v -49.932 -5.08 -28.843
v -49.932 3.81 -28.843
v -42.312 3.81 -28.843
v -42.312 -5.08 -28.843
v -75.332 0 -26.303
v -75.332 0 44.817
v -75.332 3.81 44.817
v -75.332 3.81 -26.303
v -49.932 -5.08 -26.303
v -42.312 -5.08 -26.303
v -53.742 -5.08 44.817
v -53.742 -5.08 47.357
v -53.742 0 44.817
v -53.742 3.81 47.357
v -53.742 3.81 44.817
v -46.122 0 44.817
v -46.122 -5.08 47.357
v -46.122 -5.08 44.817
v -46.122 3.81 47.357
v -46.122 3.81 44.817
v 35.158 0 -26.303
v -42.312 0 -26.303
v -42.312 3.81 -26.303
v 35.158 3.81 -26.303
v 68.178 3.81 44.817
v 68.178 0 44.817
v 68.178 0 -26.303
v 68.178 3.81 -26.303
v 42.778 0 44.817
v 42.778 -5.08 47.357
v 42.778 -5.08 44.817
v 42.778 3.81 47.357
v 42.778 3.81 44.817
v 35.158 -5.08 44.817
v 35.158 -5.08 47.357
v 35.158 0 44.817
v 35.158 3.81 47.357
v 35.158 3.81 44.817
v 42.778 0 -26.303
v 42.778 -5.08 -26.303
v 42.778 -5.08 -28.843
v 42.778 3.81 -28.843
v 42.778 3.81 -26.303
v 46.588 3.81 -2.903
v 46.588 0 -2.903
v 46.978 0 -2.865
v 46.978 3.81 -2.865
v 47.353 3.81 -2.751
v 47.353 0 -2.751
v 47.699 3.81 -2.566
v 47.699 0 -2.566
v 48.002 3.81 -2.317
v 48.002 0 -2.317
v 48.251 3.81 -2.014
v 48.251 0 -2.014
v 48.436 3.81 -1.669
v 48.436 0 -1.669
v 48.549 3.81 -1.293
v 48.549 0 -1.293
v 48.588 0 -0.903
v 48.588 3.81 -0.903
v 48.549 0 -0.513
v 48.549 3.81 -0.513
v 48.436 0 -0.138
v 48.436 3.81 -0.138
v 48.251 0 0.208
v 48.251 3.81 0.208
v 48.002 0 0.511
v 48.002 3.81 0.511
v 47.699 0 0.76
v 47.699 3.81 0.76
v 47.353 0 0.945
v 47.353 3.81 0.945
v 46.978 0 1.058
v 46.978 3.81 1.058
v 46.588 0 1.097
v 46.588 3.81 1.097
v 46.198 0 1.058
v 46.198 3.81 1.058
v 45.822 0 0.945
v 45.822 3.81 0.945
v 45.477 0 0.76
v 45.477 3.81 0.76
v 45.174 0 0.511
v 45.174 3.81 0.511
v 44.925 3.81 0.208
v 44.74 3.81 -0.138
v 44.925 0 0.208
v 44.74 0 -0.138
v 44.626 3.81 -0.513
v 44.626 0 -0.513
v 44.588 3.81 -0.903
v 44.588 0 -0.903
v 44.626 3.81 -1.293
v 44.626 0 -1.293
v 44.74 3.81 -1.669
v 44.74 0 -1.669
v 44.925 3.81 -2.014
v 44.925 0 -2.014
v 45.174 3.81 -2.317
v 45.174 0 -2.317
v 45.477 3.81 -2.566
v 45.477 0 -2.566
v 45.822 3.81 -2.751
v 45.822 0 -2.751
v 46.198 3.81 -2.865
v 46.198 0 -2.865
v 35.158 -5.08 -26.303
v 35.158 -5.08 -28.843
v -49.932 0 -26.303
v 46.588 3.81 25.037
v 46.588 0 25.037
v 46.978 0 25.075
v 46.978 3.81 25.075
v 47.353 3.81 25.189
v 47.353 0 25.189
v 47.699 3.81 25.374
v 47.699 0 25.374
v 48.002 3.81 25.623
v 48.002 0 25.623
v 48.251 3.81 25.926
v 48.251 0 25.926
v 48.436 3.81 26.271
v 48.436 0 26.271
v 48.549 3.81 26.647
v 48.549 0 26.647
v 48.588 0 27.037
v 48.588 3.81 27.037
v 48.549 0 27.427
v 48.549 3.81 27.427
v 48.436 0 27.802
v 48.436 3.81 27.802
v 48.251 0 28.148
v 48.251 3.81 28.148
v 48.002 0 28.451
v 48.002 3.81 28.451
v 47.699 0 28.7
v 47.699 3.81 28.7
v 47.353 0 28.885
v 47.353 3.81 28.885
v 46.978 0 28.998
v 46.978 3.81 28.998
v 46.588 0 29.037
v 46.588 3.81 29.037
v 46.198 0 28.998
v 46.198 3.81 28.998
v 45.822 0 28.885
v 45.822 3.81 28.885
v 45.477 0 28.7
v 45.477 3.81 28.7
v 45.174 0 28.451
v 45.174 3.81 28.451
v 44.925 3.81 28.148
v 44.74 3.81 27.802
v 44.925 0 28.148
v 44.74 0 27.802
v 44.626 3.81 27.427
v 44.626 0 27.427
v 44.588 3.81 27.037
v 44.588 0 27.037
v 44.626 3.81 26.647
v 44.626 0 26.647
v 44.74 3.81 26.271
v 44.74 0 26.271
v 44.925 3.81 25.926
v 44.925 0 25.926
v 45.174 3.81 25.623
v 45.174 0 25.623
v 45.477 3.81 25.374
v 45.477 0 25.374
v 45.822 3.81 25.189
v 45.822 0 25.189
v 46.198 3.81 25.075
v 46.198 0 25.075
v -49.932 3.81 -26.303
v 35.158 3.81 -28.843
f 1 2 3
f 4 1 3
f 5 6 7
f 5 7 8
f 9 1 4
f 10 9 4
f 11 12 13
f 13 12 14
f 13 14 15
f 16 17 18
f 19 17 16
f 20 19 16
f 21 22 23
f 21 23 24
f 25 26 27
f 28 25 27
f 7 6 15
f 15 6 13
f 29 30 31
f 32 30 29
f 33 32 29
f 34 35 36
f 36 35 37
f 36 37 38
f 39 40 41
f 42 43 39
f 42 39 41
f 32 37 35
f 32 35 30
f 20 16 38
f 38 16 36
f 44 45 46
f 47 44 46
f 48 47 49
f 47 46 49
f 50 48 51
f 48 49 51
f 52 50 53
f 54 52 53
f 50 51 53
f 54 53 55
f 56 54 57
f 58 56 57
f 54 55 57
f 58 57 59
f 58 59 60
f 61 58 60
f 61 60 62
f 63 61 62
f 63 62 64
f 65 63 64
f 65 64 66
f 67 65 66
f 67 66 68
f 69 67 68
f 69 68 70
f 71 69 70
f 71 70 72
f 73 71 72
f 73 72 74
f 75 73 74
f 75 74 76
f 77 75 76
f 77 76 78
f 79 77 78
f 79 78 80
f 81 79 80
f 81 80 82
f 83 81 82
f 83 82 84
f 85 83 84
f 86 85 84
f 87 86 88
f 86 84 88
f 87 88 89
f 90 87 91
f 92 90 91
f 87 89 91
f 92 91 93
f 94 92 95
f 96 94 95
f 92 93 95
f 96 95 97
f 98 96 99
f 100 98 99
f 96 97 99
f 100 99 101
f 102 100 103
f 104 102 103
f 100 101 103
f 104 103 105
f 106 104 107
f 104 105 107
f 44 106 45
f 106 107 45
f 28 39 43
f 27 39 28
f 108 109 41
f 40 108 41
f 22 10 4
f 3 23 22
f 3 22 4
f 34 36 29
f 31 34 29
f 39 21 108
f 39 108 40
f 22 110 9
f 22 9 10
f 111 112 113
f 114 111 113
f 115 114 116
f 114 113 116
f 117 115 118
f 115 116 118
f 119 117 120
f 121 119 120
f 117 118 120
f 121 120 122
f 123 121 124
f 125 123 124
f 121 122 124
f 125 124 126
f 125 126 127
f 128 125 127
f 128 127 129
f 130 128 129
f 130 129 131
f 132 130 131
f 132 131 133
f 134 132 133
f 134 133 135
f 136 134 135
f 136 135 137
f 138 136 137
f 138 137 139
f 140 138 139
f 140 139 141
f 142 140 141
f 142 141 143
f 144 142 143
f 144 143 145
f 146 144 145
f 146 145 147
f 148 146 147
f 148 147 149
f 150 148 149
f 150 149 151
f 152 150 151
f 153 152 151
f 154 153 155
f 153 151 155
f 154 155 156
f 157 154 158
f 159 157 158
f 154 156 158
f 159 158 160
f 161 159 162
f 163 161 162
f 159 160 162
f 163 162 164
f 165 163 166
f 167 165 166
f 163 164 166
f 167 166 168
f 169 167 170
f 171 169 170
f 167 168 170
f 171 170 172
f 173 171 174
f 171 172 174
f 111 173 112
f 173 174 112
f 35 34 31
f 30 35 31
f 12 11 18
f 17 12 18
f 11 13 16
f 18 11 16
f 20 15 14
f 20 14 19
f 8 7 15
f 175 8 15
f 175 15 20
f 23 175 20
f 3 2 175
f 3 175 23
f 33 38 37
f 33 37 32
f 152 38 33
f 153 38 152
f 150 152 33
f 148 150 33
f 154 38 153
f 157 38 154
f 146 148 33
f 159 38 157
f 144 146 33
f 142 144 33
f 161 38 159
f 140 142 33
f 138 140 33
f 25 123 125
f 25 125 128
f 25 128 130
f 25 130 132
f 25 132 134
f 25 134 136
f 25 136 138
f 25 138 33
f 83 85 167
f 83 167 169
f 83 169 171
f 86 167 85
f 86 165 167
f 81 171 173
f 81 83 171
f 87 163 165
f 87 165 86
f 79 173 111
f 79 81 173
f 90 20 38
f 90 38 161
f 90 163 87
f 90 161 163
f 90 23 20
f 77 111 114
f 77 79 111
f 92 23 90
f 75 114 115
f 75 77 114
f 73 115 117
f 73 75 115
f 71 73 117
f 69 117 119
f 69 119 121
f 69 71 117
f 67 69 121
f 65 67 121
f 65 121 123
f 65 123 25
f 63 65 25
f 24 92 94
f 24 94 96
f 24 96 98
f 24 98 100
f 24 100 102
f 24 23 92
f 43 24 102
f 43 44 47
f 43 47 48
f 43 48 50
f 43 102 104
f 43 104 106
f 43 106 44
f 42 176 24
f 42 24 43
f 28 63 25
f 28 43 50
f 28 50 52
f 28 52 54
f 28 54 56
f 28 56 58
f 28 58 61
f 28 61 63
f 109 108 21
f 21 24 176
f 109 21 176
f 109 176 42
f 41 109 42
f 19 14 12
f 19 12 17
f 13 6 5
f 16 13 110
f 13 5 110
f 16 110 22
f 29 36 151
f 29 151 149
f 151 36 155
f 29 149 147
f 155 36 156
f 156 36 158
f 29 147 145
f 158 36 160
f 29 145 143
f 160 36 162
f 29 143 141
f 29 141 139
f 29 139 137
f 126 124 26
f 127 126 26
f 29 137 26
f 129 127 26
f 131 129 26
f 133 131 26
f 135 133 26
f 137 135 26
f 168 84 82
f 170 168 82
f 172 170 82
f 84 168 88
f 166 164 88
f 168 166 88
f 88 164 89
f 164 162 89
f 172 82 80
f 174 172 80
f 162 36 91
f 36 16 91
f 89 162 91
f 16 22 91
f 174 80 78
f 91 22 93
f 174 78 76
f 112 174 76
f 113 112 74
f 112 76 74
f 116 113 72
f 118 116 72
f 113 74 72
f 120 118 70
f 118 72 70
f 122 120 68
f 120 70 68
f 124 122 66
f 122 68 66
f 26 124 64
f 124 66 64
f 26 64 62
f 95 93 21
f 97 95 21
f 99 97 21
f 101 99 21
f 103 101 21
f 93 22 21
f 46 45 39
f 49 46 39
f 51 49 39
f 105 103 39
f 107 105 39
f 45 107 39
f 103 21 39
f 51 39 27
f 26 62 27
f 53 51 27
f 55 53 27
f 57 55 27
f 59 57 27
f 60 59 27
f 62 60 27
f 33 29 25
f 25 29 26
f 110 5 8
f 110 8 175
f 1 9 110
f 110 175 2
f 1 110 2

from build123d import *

# Parameters (mm, degrees)
SKETCH1_W           = 143.51
SKETCH1_H           = 71.12
BOSS_EXTRUDE1_DEPTH = 3.81
SKETCH2_W           = 7.62
SKETCH2_H           = 2.54
BOSS_EXTRUDE3_DEPTH = 8.89
SKETCH5_R           = 2
CUT_EXTRUDE2_DEPTH  = 90.125877794


with BuildPart() as part:
    # Sketch1 → Boss-Extrude1 (new body)
    with BuildSketch(Plane(origin=(0, 0, 0), x_dir=(1, 0, 0), z_dir=(0, 1, 0))):
        with Locations((-3.577228739, -9.256847507)):
            Rectangle(SKETCH1_W, SKETCH1_H)
    extrude(amount=BOSS_EXTRUDE1_DEPTH)

    # Sketch2 → Boss-Extrude3 (add)
    with BuildSketch(Plane(origin=(0, 3.81, 0), x_dir=(1, 0, 0), z_dir=(0, 1, 0))):
        with Locations((-46.122228739, 27.573152493)):
            Rectangle(SKETCH2_W, SKETCH2_H)
        with Locations((38.967771261, 27.573152493)):
            Rectangle(SKETCH2_W, SKETCH2_H)
        with Locations((-49.932228739, -46.086847507)):
            Rectangle(SKETCH2_W, SKETCH2_H)
        with Locations((38.967771261, -46.086847507)):
            Rectangle(SKETCH2_W, SKETCH2_H)
    extrude(amount=-BOSS_EXTRUDE3_DEPTH)

    # Sketch5 → Cut-Extrude2 (cut, through all)
    with BuildSketch(Plane(origin=(0, 0, 0), x_dir=(-1, 0, 0), z_dir=(0, -1, 0))):
        with Locations(Location((-46.587771261, -27.036847507, 0), (0, 0, 90))):
            Circle(SKETCH5_R)
        with Locations(Location((-46.587771261, 0.903152493, 0), (0, 0, 90))):
            Circle(SKETCH5_R)
    extrude(amount=-CUT_EXTRUDE2_DEPTH, mode=Mode.SUBTRACT)


solid = part.part
